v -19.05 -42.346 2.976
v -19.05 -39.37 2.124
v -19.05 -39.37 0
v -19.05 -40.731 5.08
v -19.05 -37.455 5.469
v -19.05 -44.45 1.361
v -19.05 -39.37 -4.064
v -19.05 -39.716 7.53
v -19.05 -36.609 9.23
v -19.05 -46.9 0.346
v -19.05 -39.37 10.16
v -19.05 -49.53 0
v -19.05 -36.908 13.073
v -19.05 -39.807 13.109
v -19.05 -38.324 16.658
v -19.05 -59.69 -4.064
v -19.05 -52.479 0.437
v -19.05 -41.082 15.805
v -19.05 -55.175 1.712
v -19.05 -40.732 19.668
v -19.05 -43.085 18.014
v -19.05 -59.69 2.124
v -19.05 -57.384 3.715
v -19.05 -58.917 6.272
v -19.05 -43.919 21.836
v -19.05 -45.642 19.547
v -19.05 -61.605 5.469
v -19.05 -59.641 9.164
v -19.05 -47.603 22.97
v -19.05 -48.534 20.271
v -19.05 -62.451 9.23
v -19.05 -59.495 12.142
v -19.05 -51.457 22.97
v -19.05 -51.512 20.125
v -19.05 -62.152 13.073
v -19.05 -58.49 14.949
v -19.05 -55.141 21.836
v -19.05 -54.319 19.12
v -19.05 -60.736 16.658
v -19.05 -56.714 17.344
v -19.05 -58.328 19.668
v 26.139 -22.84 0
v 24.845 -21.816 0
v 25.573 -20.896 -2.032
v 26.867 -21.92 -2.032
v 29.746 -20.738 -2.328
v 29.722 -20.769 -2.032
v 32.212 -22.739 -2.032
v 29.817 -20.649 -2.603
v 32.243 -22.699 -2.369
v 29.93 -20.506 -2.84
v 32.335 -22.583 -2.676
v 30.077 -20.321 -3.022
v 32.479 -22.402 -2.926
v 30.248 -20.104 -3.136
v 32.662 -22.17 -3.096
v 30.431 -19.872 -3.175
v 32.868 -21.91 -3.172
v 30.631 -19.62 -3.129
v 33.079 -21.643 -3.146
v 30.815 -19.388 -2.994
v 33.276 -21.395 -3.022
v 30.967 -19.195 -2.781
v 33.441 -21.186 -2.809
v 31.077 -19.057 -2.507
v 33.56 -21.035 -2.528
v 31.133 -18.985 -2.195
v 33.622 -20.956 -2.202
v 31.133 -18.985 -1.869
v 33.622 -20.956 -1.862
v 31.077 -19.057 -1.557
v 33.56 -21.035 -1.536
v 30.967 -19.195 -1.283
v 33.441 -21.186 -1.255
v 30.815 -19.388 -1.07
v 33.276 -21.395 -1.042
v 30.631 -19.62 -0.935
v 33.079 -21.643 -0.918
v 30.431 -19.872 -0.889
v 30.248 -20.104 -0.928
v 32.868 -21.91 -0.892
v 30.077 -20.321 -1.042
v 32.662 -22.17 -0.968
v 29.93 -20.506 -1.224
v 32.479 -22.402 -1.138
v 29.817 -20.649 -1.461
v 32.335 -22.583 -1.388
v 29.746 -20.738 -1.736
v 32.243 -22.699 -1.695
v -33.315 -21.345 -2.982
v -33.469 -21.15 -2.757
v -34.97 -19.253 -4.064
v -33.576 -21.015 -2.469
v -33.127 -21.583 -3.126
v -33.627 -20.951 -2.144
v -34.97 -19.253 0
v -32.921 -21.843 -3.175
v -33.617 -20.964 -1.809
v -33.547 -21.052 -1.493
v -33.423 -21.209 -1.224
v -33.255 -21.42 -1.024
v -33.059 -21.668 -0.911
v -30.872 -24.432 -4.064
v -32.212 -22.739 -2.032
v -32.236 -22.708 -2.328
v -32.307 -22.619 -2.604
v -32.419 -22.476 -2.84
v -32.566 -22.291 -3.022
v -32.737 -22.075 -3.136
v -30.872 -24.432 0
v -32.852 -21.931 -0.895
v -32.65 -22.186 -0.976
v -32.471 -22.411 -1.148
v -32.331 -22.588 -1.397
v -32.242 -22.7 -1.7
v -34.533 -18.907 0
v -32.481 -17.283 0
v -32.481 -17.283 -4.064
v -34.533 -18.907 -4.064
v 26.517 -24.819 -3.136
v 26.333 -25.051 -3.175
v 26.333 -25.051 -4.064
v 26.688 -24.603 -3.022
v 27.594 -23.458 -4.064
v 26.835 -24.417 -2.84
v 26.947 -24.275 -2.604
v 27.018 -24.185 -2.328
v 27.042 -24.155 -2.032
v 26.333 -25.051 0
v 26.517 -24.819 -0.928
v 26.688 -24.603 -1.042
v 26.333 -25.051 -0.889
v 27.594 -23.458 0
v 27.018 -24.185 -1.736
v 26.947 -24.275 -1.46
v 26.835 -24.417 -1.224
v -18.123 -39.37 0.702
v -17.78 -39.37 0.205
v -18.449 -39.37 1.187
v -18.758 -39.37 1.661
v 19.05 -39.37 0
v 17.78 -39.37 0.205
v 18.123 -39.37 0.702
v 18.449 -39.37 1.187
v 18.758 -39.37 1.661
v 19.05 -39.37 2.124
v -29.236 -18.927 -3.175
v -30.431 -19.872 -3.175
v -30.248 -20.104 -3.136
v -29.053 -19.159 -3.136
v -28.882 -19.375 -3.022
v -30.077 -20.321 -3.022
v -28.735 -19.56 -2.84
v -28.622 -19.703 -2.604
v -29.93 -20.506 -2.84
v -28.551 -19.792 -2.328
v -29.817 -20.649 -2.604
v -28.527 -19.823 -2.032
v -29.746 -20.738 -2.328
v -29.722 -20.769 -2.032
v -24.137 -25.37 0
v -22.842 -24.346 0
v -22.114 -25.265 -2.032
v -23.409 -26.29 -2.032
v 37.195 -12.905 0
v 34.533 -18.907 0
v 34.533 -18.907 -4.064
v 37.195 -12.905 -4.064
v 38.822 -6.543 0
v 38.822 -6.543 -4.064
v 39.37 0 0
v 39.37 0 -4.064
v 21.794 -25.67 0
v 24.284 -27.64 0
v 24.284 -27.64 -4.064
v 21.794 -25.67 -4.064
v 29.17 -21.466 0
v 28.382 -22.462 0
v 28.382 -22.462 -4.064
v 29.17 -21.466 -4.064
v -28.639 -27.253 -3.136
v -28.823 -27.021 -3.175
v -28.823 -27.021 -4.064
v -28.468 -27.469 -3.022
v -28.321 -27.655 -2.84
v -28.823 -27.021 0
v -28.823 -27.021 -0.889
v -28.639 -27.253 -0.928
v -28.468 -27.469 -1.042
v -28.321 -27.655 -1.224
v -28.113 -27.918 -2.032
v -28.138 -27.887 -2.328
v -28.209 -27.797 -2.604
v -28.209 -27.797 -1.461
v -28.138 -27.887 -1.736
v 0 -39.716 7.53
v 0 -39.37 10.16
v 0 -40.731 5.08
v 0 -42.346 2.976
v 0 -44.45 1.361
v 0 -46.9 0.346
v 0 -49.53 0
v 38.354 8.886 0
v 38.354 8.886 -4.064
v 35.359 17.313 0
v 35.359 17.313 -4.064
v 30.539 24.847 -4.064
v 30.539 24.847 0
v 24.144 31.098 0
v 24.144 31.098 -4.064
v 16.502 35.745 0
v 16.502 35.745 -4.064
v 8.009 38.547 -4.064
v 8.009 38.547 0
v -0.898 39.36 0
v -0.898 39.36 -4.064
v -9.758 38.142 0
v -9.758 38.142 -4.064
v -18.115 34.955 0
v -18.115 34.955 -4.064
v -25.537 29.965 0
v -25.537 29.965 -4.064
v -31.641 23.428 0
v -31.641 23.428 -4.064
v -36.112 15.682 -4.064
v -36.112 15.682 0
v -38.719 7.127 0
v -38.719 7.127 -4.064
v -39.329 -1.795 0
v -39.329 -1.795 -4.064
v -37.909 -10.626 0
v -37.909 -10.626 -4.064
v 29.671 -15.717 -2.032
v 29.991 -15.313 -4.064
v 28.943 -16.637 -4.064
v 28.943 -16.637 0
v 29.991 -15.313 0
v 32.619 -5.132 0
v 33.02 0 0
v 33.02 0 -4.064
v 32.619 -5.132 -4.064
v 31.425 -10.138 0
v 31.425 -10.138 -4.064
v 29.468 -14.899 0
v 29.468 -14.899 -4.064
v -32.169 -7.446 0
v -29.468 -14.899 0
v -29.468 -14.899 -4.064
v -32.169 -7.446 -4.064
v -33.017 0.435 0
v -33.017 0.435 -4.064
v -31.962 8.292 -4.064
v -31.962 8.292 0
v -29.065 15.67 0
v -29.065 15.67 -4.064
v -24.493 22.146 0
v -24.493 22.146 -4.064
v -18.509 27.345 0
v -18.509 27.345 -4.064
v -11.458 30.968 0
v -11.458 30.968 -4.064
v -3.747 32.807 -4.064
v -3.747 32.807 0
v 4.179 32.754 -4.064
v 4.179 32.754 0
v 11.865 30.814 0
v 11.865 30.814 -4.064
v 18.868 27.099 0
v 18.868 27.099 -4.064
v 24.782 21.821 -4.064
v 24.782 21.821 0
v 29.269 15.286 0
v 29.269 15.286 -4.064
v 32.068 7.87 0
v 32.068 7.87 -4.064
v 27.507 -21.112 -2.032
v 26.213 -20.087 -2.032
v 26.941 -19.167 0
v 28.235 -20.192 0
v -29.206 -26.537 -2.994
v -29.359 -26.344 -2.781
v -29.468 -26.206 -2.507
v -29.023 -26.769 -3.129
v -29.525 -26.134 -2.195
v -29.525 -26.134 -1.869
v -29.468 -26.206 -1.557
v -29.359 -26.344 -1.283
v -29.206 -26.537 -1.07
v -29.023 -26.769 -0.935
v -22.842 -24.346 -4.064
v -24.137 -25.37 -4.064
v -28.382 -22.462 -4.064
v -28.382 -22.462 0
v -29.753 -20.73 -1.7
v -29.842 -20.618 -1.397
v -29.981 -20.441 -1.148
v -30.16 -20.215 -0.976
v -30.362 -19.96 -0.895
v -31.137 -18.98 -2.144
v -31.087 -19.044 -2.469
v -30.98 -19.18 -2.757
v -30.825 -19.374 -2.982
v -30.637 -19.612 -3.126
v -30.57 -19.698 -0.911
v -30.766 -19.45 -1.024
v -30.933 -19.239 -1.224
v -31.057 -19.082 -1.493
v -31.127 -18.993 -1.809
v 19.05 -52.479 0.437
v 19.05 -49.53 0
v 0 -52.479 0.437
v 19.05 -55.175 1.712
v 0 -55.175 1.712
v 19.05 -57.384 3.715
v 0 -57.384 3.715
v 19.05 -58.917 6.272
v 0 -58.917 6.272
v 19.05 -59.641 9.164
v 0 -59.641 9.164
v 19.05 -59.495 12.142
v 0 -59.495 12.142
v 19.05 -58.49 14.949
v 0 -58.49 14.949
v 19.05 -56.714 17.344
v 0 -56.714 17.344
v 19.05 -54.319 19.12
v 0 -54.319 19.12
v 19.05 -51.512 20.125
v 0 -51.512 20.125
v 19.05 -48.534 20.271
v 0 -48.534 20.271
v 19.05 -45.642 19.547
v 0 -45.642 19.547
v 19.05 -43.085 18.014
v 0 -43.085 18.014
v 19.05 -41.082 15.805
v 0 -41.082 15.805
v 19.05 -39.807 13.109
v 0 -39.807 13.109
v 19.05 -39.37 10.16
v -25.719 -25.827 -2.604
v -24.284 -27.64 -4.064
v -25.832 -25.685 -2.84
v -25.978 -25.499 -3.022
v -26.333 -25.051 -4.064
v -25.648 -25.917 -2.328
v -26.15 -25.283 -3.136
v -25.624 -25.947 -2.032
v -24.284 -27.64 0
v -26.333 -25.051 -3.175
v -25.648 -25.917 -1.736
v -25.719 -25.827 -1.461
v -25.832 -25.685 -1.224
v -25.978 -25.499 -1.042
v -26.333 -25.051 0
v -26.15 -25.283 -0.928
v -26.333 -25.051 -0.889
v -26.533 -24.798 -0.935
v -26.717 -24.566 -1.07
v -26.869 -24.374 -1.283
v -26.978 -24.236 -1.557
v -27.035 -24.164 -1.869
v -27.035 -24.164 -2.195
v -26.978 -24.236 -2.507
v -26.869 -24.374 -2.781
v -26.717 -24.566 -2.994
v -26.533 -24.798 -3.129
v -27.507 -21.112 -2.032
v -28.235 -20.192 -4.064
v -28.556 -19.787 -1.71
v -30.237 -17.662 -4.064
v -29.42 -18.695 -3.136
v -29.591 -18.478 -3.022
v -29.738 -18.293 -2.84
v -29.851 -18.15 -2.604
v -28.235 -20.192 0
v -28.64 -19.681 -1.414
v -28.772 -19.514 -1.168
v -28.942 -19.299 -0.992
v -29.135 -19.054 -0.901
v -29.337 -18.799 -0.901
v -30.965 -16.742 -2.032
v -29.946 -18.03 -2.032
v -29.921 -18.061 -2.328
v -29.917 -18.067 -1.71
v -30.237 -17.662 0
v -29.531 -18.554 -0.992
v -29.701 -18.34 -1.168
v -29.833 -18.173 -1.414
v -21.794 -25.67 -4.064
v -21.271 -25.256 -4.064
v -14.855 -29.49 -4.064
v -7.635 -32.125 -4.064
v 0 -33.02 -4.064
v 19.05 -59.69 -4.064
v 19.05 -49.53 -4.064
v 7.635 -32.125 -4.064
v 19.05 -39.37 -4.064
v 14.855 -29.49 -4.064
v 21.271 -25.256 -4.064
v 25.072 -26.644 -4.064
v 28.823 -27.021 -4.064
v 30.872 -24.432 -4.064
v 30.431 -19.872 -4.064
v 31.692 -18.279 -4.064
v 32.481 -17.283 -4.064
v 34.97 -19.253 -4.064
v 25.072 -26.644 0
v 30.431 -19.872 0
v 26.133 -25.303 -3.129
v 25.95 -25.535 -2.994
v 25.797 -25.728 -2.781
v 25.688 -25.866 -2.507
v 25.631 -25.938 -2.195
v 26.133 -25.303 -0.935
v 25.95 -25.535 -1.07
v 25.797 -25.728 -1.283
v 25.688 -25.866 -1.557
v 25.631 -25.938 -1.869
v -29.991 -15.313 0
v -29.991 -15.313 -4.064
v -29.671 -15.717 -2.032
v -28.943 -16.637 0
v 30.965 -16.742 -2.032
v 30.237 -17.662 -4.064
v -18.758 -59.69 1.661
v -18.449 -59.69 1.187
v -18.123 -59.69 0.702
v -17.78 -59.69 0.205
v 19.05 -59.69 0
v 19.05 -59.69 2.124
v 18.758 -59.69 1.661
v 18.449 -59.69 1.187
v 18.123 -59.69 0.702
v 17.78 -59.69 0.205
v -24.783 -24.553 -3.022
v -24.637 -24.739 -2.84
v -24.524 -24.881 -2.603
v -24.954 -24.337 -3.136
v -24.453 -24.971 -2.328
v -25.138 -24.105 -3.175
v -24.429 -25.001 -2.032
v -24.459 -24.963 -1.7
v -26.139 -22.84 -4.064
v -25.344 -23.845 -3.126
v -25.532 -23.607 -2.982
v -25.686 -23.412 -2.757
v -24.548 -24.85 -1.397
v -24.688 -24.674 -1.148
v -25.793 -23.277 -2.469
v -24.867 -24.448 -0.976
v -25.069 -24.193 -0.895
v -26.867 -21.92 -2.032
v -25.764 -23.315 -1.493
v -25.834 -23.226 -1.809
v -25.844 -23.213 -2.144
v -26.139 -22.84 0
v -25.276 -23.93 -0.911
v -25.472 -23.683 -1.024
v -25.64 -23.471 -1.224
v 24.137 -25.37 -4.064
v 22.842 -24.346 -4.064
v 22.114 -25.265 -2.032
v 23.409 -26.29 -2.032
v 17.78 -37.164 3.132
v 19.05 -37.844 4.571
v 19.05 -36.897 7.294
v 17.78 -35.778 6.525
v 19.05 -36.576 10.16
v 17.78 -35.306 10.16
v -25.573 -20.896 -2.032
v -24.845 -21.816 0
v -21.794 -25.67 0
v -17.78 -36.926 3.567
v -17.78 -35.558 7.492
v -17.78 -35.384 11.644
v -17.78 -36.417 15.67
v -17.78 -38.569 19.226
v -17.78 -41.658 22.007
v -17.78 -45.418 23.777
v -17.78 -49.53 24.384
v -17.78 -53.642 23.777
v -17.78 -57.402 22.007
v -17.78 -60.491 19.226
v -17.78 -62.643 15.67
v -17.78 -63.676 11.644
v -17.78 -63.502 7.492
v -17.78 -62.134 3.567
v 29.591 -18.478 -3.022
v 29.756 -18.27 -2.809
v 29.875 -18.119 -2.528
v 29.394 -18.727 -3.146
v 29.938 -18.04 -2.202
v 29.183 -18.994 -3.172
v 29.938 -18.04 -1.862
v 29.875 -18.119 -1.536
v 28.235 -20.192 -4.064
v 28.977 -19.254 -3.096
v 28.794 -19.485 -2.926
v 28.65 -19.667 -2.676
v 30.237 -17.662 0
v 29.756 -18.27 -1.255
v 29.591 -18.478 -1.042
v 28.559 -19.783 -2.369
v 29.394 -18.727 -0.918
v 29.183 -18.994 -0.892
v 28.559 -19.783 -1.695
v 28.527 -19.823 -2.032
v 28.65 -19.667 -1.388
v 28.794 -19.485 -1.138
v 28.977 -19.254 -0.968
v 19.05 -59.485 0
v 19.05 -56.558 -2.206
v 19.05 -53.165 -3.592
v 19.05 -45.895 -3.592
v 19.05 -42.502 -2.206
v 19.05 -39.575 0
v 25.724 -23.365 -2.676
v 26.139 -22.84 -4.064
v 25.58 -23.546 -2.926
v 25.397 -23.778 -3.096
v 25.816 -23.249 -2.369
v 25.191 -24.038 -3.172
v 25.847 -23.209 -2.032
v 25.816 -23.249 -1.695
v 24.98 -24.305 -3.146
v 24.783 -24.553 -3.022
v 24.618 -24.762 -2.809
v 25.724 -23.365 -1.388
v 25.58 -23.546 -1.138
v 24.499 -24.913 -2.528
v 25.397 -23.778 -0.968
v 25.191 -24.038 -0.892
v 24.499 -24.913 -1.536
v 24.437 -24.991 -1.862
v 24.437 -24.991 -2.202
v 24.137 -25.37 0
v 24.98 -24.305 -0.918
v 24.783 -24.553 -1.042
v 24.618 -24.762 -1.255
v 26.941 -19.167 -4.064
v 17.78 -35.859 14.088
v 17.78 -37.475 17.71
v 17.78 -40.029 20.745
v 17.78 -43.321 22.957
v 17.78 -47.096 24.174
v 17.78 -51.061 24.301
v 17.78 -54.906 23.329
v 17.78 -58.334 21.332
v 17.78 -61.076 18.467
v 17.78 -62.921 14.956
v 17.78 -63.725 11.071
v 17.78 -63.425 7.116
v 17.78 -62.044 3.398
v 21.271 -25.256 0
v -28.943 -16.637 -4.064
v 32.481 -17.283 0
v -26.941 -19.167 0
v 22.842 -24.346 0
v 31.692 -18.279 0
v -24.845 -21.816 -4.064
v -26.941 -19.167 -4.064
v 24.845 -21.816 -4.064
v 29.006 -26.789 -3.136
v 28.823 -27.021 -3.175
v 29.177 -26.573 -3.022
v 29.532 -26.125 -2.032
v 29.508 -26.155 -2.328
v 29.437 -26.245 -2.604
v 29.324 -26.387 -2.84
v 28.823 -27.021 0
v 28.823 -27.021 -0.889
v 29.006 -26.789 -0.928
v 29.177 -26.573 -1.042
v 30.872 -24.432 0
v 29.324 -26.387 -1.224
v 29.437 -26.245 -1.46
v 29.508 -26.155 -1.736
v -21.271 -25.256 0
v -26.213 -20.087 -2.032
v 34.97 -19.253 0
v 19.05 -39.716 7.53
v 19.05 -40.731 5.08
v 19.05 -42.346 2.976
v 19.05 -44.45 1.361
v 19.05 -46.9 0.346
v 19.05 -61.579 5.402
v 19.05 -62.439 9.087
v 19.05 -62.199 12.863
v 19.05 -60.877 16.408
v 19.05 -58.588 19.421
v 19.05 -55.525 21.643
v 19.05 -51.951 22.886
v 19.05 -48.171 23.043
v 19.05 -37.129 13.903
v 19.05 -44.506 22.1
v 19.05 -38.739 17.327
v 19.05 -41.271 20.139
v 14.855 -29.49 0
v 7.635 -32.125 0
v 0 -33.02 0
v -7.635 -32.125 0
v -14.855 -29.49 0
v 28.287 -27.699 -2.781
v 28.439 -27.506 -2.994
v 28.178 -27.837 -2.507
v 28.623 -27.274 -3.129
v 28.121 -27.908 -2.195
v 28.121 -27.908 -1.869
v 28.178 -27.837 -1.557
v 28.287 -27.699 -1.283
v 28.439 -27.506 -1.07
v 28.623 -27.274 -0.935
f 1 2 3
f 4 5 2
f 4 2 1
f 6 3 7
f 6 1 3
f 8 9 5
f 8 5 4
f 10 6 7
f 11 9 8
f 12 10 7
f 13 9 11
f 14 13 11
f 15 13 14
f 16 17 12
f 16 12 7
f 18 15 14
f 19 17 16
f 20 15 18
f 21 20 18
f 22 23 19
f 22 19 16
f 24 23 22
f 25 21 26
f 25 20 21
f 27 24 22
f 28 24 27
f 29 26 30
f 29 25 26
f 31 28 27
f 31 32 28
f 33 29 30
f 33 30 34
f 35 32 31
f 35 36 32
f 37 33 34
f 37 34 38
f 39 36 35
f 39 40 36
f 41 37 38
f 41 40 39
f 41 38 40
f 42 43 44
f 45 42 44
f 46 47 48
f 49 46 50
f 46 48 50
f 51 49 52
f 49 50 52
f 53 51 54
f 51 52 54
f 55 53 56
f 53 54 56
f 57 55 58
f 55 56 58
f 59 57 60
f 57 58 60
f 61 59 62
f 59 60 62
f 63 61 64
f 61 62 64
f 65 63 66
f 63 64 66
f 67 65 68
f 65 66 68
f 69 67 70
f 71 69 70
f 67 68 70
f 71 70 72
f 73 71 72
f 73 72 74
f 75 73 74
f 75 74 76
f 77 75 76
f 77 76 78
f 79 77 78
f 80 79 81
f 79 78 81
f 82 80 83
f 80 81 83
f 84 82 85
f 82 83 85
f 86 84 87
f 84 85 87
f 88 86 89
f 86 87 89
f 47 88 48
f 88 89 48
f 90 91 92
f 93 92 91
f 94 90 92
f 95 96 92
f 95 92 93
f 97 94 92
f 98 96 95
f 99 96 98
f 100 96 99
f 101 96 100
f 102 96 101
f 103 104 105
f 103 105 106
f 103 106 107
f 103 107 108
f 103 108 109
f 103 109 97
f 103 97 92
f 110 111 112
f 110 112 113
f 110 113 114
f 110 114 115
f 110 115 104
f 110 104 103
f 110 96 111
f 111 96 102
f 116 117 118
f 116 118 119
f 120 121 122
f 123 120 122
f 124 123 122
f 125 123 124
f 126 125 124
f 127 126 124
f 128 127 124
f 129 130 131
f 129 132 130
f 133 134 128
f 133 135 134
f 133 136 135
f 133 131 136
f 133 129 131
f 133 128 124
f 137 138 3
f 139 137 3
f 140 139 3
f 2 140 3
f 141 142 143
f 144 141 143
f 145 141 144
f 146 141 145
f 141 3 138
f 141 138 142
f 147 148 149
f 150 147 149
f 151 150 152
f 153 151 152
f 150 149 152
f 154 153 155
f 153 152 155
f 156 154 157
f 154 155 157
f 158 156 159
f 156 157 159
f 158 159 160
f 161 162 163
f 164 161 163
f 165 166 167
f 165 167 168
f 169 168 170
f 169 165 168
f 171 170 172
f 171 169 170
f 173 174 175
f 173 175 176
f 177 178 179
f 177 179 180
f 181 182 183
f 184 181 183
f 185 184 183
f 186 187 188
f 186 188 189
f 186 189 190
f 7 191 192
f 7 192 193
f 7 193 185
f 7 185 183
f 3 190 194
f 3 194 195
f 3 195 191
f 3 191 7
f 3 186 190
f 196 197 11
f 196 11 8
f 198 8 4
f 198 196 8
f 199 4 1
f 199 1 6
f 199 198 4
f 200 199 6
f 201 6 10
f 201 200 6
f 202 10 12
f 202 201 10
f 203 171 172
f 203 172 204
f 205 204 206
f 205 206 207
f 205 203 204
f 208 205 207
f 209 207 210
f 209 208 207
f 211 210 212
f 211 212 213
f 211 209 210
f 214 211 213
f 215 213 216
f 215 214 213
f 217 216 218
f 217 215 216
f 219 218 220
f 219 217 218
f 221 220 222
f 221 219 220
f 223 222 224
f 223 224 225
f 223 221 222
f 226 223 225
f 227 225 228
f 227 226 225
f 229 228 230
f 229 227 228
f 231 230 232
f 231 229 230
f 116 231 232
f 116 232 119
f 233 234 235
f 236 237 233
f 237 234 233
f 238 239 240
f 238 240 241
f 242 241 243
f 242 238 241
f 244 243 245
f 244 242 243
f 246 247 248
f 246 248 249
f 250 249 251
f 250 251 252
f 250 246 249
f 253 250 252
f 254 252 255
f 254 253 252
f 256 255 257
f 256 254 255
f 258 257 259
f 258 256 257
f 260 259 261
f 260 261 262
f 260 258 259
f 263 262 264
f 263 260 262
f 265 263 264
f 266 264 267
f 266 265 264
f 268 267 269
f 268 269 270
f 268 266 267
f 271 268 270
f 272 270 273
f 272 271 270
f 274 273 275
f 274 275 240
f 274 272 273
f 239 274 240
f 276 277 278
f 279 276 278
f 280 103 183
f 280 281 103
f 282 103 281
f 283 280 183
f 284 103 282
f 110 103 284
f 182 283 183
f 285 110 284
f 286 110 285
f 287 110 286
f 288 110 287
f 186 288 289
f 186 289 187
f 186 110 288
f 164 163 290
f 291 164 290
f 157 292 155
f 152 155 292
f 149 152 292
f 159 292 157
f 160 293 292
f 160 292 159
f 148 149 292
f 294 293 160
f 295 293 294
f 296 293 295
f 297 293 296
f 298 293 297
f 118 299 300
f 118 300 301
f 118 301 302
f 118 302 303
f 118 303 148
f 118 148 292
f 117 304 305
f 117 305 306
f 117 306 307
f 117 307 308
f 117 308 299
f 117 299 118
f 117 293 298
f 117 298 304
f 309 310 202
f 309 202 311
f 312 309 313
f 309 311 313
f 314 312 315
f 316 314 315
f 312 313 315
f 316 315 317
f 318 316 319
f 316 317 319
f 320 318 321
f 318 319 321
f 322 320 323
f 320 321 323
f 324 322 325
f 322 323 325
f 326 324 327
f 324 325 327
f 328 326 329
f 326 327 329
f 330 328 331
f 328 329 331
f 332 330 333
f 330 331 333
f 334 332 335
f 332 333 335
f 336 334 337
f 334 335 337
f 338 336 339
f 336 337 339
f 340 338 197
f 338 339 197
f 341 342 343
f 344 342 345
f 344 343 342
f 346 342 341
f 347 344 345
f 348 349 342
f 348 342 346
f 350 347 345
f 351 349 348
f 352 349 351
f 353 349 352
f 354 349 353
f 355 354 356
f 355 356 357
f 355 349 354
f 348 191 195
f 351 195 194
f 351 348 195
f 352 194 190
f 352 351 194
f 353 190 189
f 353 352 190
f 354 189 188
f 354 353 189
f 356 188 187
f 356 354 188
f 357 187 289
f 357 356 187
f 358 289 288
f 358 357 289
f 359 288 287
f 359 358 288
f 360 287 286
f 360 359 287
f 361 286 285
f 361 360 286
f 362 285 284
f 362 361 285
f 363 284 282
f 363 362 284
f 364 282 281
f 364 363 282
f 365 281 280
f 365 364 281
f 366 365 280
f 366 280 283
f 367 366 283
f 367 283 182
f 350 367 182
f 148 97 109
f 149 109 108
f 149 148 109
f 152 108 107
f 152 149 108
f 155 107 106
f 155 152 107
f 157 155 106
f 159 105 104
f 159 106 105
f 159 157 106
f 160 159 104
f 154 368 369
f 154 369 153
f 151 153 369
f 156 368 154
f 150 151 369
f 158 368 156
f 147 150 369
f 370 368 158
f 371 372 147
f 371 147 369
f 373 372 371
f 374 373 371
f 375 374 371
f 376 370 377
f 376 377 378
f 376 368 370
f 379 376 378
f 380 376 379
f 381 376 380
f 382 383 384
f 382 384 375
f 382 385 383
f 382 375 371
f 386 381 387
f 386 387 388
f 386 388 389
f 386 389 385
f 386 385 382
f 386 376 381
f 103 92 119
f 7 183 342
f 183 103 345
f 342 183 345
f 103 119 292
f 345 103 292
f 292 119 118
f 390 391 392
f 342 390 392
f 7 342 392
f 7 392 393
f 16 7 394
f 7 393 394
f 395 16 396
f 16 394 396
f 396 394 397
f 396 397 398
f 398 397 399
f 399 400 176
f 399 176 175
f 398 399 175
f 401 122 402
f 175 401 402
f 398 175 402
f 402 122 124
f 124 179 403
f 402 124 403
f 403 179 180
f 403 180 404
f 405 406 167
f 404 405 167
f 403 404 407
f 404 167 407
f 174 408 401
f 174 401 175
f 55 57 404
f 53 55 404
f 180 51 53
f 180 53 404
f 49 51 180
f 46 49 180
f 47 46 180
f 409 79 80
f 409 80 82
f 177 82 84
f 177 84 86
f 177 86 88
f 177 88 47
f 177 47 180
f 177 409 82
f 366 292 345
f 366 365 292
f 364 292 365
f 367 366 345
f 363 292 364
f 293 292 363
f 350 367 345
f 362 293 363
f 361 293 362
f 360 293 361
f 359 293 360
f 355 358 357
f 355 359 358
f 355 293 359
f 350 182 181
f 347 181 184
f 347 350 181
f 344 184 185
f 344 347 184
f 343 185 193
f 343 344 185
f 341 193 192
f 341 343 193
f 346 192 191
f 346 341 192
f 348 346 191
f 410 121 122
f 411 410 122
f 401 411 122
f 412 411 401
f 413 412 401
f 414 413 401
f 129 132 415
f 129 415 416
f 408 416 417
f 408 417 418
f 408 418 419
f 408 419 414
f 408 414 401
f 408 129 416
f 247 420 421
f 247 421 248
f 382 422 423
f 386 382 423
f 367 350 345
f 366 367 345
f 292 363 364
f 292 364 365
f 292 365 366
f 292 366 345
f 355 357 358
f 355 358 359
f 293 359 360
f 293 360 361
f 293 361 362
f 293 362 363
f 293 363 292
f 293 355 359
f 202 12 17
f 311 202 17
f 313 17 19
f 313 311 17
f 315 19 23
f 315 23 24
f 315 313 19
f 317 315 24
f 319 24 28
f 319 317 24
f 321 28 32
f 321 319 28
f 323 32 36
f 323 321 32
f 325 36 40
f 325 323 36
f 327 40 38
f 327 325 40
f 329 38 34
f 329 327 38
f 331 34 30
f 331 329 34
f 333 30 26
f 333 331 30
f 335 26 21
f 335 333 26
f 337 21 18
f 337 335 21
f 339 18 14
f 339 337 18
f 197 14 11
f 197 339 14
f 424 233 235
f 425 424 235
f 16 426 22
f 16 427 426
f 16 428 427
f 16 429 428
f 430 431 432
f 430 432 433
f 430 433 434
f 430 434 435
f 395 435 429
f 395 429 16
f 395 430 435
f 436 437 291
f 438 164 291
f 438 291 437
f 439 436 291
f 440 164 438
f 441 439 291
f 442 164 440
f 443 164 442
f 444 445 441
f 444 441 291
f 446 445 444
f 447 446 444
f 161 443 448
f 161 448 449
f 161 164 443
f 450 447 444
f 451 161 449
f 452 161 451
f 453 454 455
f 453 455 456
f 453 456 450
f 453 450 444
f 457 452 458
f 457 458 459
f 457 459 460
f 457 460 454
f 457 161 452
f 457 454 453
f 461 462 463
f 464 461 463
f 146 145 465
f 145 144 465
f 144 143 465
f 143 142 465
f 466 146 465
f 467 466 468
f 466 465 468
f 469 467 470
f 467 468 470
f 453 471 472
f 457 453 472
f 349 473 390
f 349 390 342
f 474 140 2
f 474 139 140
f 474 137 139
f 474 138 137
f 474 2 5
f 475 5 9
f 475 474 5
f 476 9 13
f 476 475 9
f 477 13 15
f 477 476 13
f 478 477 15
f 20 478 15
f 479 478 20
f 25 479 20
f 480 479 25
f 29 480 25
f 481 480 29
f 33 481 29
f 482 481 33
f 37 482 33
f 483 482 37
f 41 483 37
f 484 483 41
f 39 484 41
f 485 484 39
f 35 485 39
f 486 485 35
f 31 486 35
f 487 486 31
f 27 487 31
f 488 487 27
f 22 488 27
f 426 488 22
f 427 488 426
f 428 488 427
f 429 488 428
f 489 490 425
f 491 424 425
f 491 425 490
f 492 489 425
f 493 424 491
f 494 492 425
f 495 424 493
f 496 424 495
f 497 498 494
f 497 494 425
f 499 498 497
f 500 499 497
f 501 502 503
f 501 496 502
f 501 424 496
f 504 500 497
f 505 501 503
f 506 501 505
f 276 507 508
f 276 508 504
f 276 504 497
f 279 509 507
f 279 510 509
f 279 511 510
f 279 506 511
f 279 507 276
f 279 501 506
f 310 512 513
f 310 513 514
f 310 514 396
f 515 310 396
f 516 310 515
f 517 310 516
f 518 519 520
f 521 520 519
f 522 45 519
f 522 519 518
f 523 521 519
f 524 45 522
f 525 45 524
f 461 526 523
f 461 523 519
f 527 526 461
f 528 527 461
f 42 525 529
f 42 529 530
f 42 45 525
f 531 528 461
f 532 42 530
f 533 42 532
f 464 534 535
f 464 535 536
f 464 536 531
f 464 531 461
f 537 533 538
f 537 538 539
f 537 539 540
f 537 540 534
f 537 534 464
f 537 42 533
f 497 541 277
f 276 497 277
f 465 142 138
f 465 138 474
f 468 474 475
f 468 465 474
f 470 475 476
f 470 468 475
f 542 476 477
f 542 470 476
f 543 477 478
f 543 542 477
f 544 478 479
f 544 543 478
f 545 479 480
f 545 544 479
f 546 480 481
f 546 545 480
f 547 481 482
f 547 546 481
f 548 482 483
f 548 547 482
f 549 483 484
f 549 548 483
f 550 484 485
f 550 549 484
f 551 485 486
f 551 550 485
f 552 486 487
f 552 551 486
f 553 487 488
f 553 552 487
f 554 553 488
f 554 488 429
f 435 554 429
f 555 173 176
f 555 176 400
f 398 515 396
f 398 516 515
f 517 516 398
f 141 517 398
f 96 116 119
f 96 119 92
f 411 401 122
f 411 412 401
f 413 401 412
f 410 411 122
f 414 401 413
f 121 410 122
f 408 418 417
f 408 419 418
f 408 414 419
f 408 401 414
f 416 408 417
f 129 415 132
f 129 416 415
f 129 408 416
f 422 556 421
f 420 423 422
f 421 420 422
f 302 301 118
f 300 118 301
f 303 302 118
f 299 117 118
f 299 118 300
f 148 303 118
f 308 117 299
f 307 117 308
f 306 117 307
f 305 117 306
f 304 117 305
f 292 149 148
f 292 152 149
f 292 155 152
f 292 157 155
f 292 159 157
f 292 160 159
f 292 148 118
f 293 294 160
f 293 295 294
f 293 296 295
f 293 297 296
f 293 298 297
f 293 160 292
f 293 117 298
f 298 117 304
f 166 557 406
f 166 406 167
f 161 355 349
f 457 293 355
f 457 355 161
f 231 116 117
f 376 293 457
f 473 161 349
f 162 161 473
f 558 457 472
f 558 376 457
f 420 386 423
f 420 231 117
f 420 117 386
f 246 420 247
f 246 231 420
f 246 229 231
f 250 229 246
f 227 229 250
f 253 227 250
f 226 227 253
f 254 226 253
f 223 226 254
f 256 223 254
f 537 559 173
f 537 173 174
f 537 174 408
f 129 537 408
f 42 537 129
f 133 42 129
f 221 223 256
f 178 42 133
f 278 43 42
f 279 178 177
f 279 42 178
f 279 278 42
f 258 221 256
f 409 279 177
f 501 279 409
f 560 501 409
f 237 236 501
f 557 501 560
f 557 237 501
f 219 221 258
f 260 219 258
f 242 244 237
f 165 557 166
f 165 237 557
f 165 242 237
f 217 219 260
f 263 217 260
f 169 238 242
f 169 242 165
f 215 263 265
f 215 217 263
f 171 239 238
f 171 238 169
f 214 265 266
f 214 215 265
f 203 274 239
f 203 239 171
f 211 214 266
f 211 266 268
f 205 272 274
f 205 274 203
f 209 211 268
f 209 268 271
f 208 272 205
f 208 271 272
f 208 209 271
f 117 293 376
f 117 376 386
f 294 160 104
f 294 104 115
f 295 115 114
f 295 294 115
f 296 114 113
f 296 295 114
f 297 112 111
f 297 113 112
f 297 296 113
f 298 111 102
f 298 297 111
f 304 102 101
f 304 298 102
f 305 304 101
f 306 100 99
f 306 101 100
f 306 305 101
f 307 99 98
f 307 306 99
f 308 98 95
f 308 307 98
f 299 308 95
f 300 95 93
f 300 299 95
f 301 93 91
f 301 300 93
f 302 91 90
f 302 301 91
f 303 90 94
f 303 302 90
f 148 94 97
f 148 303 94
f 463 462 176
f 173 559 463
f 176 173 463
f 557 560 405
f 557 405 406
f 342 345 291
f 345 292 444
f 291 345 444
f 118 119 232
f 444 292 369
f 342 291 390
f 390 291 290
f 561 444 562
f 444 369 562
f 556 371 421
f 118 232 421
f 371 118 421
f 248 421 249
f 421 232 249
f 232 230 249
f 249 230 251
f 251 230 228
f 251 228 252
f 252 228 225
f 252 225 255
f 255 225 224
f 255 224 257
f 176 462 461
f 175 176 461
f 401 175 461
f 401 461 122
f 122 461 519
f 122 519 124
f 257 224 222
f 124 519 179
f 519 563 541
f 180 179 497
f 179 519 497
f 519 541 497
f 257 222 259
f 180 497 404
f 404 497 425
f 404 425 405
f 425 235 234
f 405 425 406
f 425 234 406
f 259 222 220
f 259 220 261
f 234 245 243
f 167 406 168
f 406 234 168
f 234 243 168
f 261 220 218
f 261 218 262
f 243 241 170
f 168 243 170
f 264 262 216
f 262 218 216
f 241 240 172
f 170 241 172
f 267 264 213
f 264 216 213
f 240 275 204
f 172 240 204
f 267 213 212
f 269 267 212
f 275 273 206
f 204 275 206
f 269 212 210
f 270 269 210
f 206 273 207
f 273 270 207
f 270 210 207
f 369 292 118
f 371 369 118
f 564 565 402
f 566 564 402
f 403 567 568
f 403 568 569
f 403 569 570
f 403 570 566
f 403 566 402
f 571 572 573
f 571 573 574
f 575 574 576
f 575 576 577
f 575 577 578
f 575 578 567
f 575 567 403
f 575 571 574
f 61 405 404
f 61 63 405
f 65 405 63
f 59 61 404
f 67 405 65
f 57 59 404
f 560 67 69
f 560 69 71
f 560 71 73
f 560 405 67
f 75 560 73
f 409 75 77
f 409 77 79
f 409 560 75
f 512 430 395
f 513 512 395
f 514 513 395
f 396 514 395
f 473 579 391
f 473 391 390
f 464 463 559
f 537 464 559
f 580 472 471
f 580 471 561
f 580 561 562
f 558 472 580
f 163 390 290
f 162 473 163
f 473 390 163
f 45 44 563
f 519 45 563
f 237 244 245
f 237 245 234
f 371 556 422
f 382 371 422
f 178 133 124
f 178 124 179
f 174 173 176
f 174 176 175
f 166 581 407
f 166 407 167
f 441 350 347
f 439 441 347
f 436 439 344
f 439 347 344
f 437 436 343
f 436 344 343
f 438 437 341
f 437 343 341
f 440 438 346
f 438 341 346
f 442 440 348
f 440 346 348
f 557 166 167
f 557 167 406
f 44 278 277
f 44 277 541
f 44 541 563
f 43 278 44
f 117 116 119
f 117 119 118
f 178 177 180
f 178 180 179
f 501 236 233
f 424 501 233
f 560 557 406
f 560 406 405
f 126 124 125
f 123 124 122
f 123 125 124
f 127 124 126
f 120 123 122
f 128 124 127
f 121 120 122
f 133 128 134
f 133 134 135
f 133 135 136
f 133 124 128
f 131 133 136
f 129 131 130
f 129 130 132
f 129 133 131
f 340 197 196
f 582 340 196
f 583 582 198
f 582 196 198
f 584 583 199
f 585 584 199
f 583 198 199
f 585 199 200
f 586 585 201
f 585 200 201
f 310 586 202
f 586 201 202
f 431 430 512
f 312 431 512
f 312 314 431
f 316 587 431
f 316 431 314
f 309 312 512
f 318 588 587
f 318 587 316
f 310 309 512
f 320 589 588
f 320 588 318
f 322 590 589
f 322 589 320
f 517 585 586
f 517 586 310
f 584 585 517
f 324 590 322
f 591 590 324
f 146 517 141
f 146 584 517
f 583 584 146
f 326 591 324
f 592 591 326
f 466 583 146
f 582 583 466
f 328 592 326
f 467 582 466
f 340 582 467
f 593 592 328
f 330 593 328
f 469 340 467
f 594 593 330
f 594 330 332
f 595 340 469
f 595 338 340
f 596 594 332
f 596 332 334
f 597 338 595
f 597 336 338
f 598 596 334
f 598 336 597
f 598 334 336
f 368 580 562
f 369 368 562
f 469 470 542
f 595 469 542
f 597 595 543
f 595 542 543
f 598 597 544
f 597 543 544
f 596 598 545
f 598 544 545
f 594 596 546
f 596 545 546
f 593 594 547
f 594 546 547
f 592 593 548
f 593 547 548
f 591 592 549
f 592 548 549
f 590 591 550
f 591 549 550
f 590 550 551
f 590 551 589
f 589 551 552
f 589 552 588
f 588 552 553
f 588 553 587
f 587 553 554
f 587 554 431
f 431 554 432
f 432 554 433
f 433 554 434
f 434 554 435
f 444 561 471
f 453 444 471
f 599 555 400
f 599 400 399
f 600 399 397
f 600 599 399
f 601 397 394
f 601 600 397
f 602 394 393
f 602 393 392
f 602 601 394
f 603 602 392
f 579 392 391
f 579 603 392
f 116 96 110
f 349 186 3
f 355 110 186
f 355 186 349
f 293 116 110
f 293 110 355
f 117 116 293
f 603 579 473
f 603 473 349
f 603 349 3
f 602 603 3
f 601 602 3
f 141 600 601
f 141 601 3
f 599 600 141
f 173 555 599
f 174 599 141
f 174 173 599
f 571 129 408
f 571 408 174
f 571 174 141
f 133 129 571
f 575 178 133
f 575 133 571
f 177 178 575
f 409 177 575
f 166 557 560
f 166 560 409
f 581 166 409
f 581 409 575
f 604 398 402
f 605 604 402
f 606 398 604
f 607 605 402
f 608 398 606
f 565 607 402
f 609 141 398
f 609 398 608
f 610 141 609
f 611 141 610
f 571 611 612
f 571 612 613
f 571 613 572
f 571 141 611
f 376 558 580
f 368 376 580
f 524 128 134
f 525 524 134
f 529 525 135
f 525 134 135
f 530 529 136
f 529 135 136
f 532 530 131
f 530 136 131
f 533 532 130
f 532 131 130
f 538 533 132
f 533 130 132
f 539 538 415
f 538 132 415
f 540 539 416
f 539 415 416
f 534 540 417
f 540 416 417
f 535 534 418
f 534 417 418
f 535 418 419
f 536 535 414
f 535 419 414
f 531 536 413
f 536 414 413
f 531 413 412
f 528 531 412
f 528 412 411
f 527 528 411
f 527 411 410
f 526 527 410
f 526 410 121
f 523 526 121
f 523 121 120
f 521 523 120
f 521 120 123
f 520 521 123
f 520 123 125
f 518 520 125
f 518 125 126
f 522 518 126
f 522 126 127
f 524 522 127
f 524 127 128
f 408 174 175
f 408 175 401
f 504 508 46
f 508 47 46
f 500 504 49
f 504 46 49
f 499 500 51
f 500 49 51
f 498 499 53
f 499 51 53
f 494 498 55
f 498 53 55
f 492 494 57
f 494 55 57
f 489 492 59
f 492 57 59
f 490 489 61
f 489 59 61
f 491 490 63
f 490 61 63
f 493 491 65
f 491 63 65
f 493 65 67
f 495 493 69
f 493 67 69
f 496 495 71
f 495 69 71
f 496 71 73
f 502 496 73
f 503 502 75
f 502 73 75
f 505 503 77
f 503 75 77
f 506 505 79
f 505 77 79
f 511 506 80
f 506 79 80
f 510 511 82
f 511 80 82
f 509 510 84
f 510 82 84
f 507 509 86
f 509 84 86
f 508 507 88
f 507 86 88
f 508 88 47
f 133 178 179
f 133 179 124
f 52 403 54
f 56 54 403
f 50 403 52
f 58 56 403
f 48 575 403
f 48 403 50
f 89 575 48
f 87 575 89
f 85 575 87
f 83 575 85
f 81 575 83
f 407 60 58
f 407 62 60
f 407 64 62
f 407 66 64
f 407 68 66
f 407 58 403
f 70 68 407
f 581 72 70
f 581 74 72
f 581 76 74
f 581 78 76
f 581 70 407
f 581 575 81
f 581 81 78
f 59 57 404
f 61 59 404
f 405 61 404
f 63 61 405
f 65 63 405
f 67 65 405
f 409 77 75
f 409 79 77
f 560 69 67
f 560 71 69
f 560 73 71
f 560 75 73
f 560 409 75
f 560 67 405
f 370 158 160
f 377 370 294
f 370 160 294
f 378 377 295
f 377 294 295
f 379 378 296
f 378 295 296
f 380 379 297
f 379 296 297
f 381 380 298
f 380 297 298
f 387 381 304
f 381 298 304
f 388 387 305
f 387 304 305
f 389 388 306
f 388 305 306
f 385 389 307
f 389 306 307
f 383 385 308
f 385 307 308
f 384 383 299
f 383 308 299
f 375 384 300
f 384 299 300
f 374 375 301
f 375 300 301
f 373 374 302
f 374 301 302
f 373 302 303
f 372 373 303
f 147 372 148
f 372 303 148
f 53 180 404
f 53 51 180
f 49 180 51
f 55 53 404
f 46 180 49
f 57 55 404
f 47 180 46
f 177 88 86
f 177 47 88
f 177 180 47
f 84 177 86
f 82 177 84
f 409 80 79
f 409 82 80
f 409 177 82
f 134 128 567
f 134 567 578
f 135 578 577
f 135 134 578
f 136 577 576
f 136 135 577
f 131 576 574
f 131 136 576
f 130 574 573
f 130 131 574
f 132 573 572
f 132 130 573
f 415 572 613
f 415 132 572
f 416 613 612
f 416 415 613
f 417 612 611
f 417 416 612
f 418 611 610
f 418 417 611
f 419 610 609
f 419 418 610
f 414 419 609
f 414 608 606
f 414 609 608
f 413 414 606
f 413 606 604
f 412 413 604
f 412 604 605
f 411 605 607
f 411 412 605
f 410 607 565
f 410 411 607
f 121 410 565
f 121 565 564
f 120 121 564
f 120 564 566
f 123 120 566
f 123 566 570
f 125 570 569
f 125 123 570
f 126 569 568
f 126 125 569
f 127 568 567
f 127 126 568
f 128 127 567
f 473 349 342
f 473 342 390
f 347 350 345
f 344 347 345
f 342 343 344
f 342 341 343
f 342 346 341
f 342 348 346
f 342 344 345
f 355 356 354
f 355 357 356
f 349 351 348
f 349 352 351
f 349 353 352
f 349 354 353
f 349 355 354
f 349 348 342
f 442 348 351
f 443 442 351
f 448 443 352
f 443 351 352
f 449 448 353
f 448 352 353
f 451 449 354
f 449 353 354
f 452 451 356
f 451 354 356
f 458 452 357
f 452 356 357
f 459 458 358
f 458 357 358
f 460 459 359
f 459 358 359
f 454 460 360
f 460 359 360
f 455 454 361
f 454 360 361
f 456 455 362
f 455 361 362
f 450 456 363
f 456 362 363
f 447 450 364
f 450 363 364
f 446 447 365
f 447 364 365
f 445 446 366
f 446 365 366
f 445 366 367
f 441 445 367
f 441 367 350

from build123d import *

# Parameters (mm, degrees)
F1_DEPTH  = 4.064
F2_DEPTH  = 4.064
F4_DEPTH  = 12.7
F5_R      = 1.143
F6_DEPTH  = 12.7
F7_R      = 1.143
F8_DEPTH  = 1.651
F9_R      = 1.143
F10_DEPTH = 1.651
F12_DEPTH = 19.05
F13_SIZE  = 1.27


with BuildPart() as f1:
    # F0 (on Top) → F1 (new body)
    with BuildSketch(Plane.XY):
        with BuildLine():
            ThreePointArc((-29.4677101906, -14.8988072046), (-7.6582181186, 32.1196527884), (33.02, 0))
            ThreePointArc((33.02, 0), (32.1196527884, -7.6582181186), (29.4677101906, -14.8988072046))
            Line((29.4677101906, -14.8988072046), (29.990846543, -15.3128161889))
            Line((29.990846543, -15.3128161889), (25.8925801012, -20.4913322091))
            Line((25.8925801012, -20.4913322091), (28.3822512648, -22.4616526138))
            Line((28.3822512648, -22.4616526138), (29.1703794266, -21.4657841484))
            Line((29.1703794266, -21.4657841484), (30.4313844857, -19.8723946037))
            Line((30.4313844857, -19.8723946037), (31.6923895447, -18.279005059))
            Line((31.6923895447, -18.279005059), (32.4805177066, -17.2831365936))
            Line((32.4805177066, -17.2831365936), (34.5327627618, -18.9072789168))
            ThreePointArc((34.5327627618, -18.9072789168), (38.1415244185, -9.7581255902), (39.37, 0))
            ThreePointArc((39.37, 0), (-9.7581255902, 38.1415244185), (-34.5327627618, -18.9072789168))
            Line((-34.5327627618, -18.9072789168), (-32.4805177066, -17.2831365936))
            Line((-32.4805177066, -17.2831365936), (-30.4313844857, -19.8723946037))
            Line((-30.4313844857, -19.8723946037), (-28.3822512648, -22.4616526138))
            Line((-28.3822512648, -22.4616526138), (-25.8925801012, -20.4913322091))
            Line((-25.8925801012, -20.4913322091), (-29.990846543, -15.3128161889))
            Line((-29.990846543, -15.3128161889), (-29.4677101906, -14.8988072046))
        make_face()
        Polygon((-21.7943136594, -25.6698482293), (-25.8925801012, -20.4913322091), (-28.3822512648, -22.4616526138), (-26.3331180438, -25.0509106239), (-24.2839848229, -27.6401686341), align=None)
        Polygon((28.3822512648, -22.4616526138), (25.8925801012, -20.4913322091), (21.7943136594, -25.6698482293), (24.2839848229, -27.6401686341), (25.0721129848, -26.6443001686), (26.3331180438, -25.0509106239), (27.5941231029, -23.4575210793), align=None)
    extrude(amount=-F1_DEPTH)


with BuildPart() as f2:
    # F0 (on Top) → F2 (new body)
    with BuildSketch(Plane.XY):
        Polygon((0, -59.69), (0, -39.37), (-10.9520430108, -39.37), (-15.0010215054, -39.37), (-19.05, -39.37), (-19.05, -59.69), align=None)
        Polygon((10.9520430108, -39.37), (0, -39.37), (0, -59.69), (19.05, -59.69), (19.05, -39.37), (15.0010215054, -39.37), align=None)
        with BuildLine():
            ThreePointArc((-18.7699951594, -34.6075740513), (-24.0499346053, -31.1704595006), (-28.714015795, -26.935147984))
            Line((-28.714015795, -26.935147984), (-28.8227892074, -27.0212310287))
            Line((-28.8227892074, -27.0212310287), (-19.05, -39.37))
            Line((-19.05, -39.37), (-15.0010215054, -39.37))
            Line((-15.0010215054, -39.37), (-18.7699951594, -34.6075740513))
        make_face()
        with BuildLine():
            Line((-10.9520430108, -39.37), (-12.5874453828, -37.3035268941))
            ThreePointArc((-12.5874453828, -37.3035268941), (-15.7365596549, -36.0881918393), (-18.7699951594, -34.6075740513))
            Line((-18.7699951594, -34.6075740513), (-15.0010215054, -39.37))
            Line((-15.0010215054, -39.37), (-10.9520430108, -39.37))
        make_face()
        with BuildLine():
            ThreePointArc((0, -39.37), (-6.3779717066, -38.8499469357), (-12.5874453828, -37.3035268941))
            Line((-12.5874453828, -37.3035268941), (-10.9520430108, -39.37))
            Line((-10.9520430108, -39.37), (0, -39.37))
        make_face()
        with BuildLine():
            ThreePointArc((21.271177307, -25.2558392451), (0, -33.02), (-21.271177307, -25.2558392451))
            Line((-21.271177307, -25.2558392451), (-21.7943136594, -25.6698482293))
            Line((-21.7943136594, -25.6698482293), (-12.5874453828, -37.3035268941))
            ThreePointArc((-12.5874453828, -37.3035268941), (-6.3779717066, -38.8499469357), (0, -39.37))
            ThreePointArc((0, -39.37), (6.3779717066, -38.8499469357), (12.5874453828, -37.3035268941))
            Line((12.5874453828, -37.3035268941), (21.7943136594, -25.6698482293))
            Line((21.7943136594, -25.6698482293), (21.271177307, -25.2558392451))
        make_face()
        with BuildLine():
            Line((24.2839848229, -27.6401686341), (21.7943136594, -25.6698482293))
            Line((21.7943136594, -25.6698482293), (12.5874453828, -37.3035268941))
            ThreePointArc((12.5874453828, -37.3035268941), (15.7365596549, -36.0881918393), (18.7699951594, -34.6075740513))
            Line((18.7699951594, -34.6075740513), (24.2839848229, -27.6401686341))
        make_face()
        with BuildLine():
            Line((10.9520430108, -39.37), (12.5874453828, -37.3035268941))
            ThreePointArc((12.5874453828, -37.3035268941), (6.3779717066, -38.8499469357), (0, -39.37))
            Line((0, -39.37), (10.9520430108, -39.37))
        make_face()
        with BuildLine():
            ThreePointArc((18.7699951594, -34.6075740513), (15.7365596549, -36.0881918393), (12.5874453828, -37.3035268941))
            Line((12.5874453828, -37.3035268941), (10.9520430108, -39.37))
            Line((10.9520430108, -39.37), (15.0010215054, -39.37))
            Line((15.0010215054, -39.37), (18.7699951594, -34.6075740513))
        make_face()
        with BuildLine():
            Line((28.8227892074, -27.0212310287), (28.714015795, -26.935147984))
            ThreePointArc((28.714015795, -26.935147984), (24.0499346053, -31.1704595006), (18.7699951594, -34.6075740513))
            Line((18.7699951594, -34.6075740513), (15.0010215054, -39.37))
            Line((15.0010215054, -39.37), (19.05, -39.37))
            Line((19.05, -39.37), (28.8227892074, -27.0212310287))
        make_face()
        with BuildLine():
            Line((25.0721129848, -26.6443001686), (24.2839848229, -27.6401686341))
            Line((24.2839848229, -27.6401686341), (18.7699951594, -34.6075740513))
            ThreePointArc((18.7699951594, -34.6075740513), (24.0499346053, -31.1704595006), (28.714015795, -26.935147984))
            Line((28.714015795, -26.935147984), (26.3331180438, -25.0509106239))
            Line((26.3331180438, -25.0509106239), (25.0721129848, -26.6443001686))
        make_face()
        with BuildLine():
            Line((28.8227892074, -27.0212310287), (30.8719224283, -24.4319730185))
            ThreePointArc((30.8719224283, -24.4319730185), (29.8192468, -25.7062136512), (28.714015795, -26.935147984))
            Line((28.714015795, -26.935147984), (28.8227892074, -27.0212310287))
        make_face()
        with BuildLine():
            Line((30.8719224283, -24.4319730185), (28.3822512648, -22.4616526138))
            Line((28.3822512648, -22.4616526138), (27.5941231029, -23.4575210793))
            Line((27.5941231029, -23.4575210793), (26.3331180438, -25.0509106239))
            Line((26.3331180438, -25.0509106239), (28.714015795, -26.935147984))
            ThreePointArc((28.714015795, -26.935147984), (29.8192468, -25.7062136512), (30.8719224283, -24.4319730185))
        make_face()
        with BuildLine():
            Line((29.1703794266, -21.4657841484), (28.3822512648, -22.4616526138))
            Line((28.3822512648, -22.4616526138), (30.8719224283, -24.4319730185))
            ThreePointArc((30.8719224283, -24.4319730185), (31.8701873763, -23.1146718904), (32.8122822369, -21.7566319638))
            Line((32.8122822369, -21.7566319638), (30.4313844857, -19.8723946037))
            Line((30.4313844857, -19.8723946037), (29.1703794266, -21.4657841484))
        make_face()
        with BuildLine():
            Line((30.4313844857, -19.8723946037), (32.8122822369, -21.7566319638))
            ThreePointArc((32.8122822369, -21.7566319638), (33.702647888, -20.3501455851), (34.5327627618, -18.9072789168))
            Line((34.5327627618, -18.9072789168), (32.4805177066, -17.2831365936))
            Line((32.4805177066, -17.2831365936), (31.6923895447, -18.279005059))
            Line((31.6923895447, -18.279005059), (30.4313844857, -19.8723946037))
        make_face()
        with BuildLine():
            Line((-12.5874453828, -37.3035268941), (-21.7943136594, -25.6698482293))
            Line((-21.7943136594, -25.6698482293), (-24.2839848229, -27.6401686341))
            Line((-24.2839848229, -27.6401686341), (-18.7699951594, -34.6075740513))
            ThreePointArc((-18.7699951594, -34.6075740513), (-15.7365596549, -36.0881918393), (-12.5874453828, -37.3035268941))
        make_face()
        with BuildLine():
            ThreePointArc((-28.714015795, -26.935147984), (-29.8192468, -25.7062136512), (-30.8719224283, -24.4319730185))
            Line((-30.8719224283, -24.4319730185), (-28.8227892074, -27.0212310287))
            Line((-28.8227892074, -27.0212310287), (-28.714015795, -26.935147984))
        make_face()
        with BuildLine():
            Line((-24.2839848229, -27.6401686341), (-26.3331180438, -25.0509106239))
            Line((-26.3331180438, -25.0509106239), (-28.714015795, -26.935147984))
            ThreePointArc((-28.714015795, -26.935147984), (-24.0499346053, -31.1704595006), (-18.7699951594, -34.6075740513))
            Line((-18.7699951594, -34.6075740513), (-24.2839848229, -27.6401686341))
        make_face()
        with BuildLine():
            Line((-26.3331180438, -25.0509106239), (-28.3822512648, -22.4616526138))
            Line((-28.3822512648, -22.4616526138), (-30.8719224283, -24.4319730185))
            ThreePointArc((-30.8719224283, -24.4319730185), (-29.8192468, -25.7062136512), (-28.714015795, -26.935147984))
            Line((-28.714015795, -26.935147984), (-26.3331180438, -25.0509106239))
        make_face()
        with BuildLine():
            Line((-30.8719224283, -24.4319730185), (-28.3822512648, -22.4616526138))
            Line((-28.3822512648, -22.4616526138), (-30.4313844857, -19.8723946037))
            Line((-30.4313844857, -19.8723946037), (-32.8122822369, -21.7566319638))
            ThreePointArc((-32.8122822369, -21.7566319638), (-31.8701873763, -23.1146718904), (-30.8719224283, -24.4319730185))
        make_face()
        with BuildLine():
            Line((-32.8122822369, -21.7566319638), (-30.4313844857, -19.8723946037))
            Line((-30.4313844857, -19.8723946037), (-32.4805177066, -17.2831365936))
            Line((-32.4805177066, -17.2831365936), (-34.5327627618, -18.9072789168))
            ThreePointArc((-34.5327627618, -18.9072789168), (-33.702647888, -20.3501455851), (-32.8122822369, -21.7566319638))
        make_face()
        with BuildLine():
            ThreePointArc((32.8122822369, -21.7566319638), (31.8701873763, -23.1146718904), (30.8719224283, -24.4319730185))
            Line((30.8719224283, -24.4319730185), (34.9701888702, -19.2534569983))
            Line((34.9701888702, -19.2534569983), (34.5327627618, -18.9072789168))
            ThreePointArc((34.5327627618, -18.9072789168), (33.702647888, -20.3501455851), (32.8122822369, -21.7566319638))
        make_face()
        with BuildLine():
            Line((-34.9701888702, -19.2534569983), (-30.8719224283, -24.4319730185))
            ThreePointArc((-30.8719224283, -24.4319730185), (-31.8701873763, -23.1146718904), (-32.8122822369, -21.7566319638))
            ThreePointArc((-32.8122822369, -21.7566319638), (-33.702647888, -20.3501455851), (-34.5327627618, -18.9072789168))
            Line((-34.5327627618, -18.9072789168), (-34.9701888702, -19.2534569983))
        make_face()
    extrude(amount=-F2_DEPTH)


with BuildPart() as f4_tool:
    # F3 (on face) → F4 (new body, symmetric)
    with BuildSketch(Plane(origin=(-28.3822512648, -22.4616526138, 0), x_dir=(0.6205733558, -0.784148398, 0), z_dir=(-0.784148398, -0.6205733558, 0))):
        with BuildLine():
            ThreePointArc((-2.159, -2.032), (-4.1102230509, -1.2237769491), (-3.302, -3.175))
            ThreePointArc((-3.302, -3.175), (-2.4937769491, -2.8402230509), (-2.159, -2.032))
        make_face()
        with BuildLine():
            ThreePointArc((4.445, -2.032), (2.4937769491, -1.2237769491), (3.302, -3.175))
            ThreePointArc((3.302, -3.175), (4.1102230509, -2.8402230509), (4.445, -2.032))
        make_face()
    extrude(amount=F4_DEPTH, both=True)


with BuildPart() as f1_1:
    add(f1.part)

    # F4: cut by f4_tool
    add(f4_tool.part, mode=Mode.SUBTRACT)


with BuildPart() as f2_1:
    add(f2.part)

    # F4: cut by f4_tool
    add(f4_tool.part, mode=Mode.SUBTRACT)


with BuildPart() as f6_tool:
    # F5 (on face) → F6 (new body, symmetric)
    with BuildSketch(Plane(origin=(28.3822512648, -22.4616526138, 0), x_dir=(0.6205733558, 0.784148398, 0), z_dir=(0.784148398, -0.6205733558, 0))):
        with Locations((-3.302, -2.032)):
            Circle(F5_R)
        with BuildLine():
            ThreePointArc((4.445, -2.032), (3.302, -0.889), (2.159, -2.032))
            ThreePointArc((2.159, -2.032), (3.302, -3.175), (4.445, -2.032))
        make_face()
    extrude(amount=F6_DEPTH, both=True)


with BuildPart() as f1_2:
    add(f1_1.part)

    # F6: cut by f6_tool
    add(f6_tool.part, mode=Mode.SUBTRACT)

    # F7 (on face) → F8 (cut)
    with BuildSketch(Plane(origin=(-25.8925801012, -20.4913322091, 0), x_dir=(-0.6205733558, 0.784148398, 0), z_dir=(0.784148398, 0.6205733558, 0))):
        Polygon((1.6888833479, -4.064), (3.302, -4.064), (4.9151166521, -4.064), (6.0882923991, -2.032), (4.9151166521, 0), (1.6888833479, 0), (0.5157076009, -2.032), align=None)
        with BuildLine():
            ThreePointArc((3.302, -3.175), (2.4937769491, -1.2237769491), (4.445, -2.032))
            ThreePointArc((4.445, -2.032), (4.1102230509, -2.8402230509), (3.302, -3.175))
        make_face(mode=Mode.SUBTRACT)
        Polygon((-4.9151166521, -4.064), (-1.6888833479, -4.064), (-0.5157076009, -2.032), (-1.6888833479, 0), (-4.9151166521, 0), (-6.0882923991, -2.032), align=None)
        with Locations((-3.302, -2.032)):
            Circle(F7_R, mode=Mode.SUBTRACT)
    extrude(amount=-F8_DEPTH, mode=Mode.SUBTRACT)

    # F9 (on face) → F10 (cut)
    with BuildSketch(Plane(origin=(25.8925801012, -20.4913322091, 0), x_dir=(-0.6205733558, -0.784148398, 0), z_dir=(-0.784148398, 0.6205733558, 0))):
        Polygon((-1.6888833479, 0), (-4.9151166521, 0), (-6.0882923991, -2.032), (-4.9151166521, -4.064), (-1.6888833479, -4.064), (-0.5157076009, -2.032), align=None)
        with Locations((-3.302, -2.032)):
            Circle(F9_R, mode=Mode.SUBTRACT)
        Polygon((4.9151166521, 0), (1.6888833479, 0), (0.5157076009, -2.032), (1.6888833479, -4.064), (4.9151166521, -4.064), (6.0882923991, -2.032), align=None)
        with Locations((3.302, -2.032)):
            Circle(F9_R, mode=Mode.SUBTRACT)
    extrude(amount=-F10_DEPTH, mode=Mode.SUBTRACT)


with BuildPart() as f2_2:
    add(f2_1.part)

    # F6: cut by f6_tool
    add(f6_tool.part, mode=Mode.SUBTRACT)

    # F11 (on Right) → F12 (join, symmetric)
    with BuildSketch(Plane.YZ):
        with BuildLine():
            ThreePointArc((-49.53, -4.064), (-44.1538333359, -3.0088650992), (-39.5752736853, 0))
            Line((-39.5752736853, 0), (-49.53, 0))
            Line((-49.53, 0), (-49.53, -4.064))
        make_face()
        with BuildLine():
            Line((-49.53, -4.064), (-49.53, 0))
            Line((-49.53, 0), (-59.4847263147, 0))
            ThreePointArc((-59.4847263147, 0), (-54.9061666641, -3.0088650992), (-49.53, -4.064))
        make_face()
        with BuildLine():
            Line((-49.53, 0), (-39.5752736853, 0))
            ThreePointArc((-39.5752736853, 0), (-39.4721131444, 0.1021131444), (-39.37, 0.2052736853))
            ThreePointArc((-39.37, 0.2052736853), (-36.3611349008, 4.7838333359), (-35.306, 10.16))
            ThreePointArc((-35.306, 10.16), (-54.9061666641, 23.3288650992), (-59.69, 0.2052736853))
            ThreePointArc((-59.69, 0.2052736853), (-59.5878868556, 0.1021131444), (-59.4847263147, 0))
            Line((-59.4847263147, 0), (-49.53, 0))
        make_face()
        with BuildLine():
            ThreePointArc((-39.37, 10.16), (-42.3457951031, 2.9757951031), (-49.53, 0))
            ThreePointArc((-49.53, 0), (-56.7142048969, 17.3442048969), (-39.37, 10.16))
        make_face(mode=Mode.SUBTRACT)
        with BuildLine():
            Line((-39.5752736853, 0), (-39.37, 0))
            Line((-39.37, 0), (-39.37, 0.2052736853))
            ThreePointArc((-39.37, 0.2052736853), (-39.4721131444, 0.1021131444), (-39.5752736853, 0))
        make_face()
        with BuildLine():
            Line((-59.69, 0), (-59.4847263147, 0))
            ThreePointArc((-59.4847263147, 0), (-59.5878868556, 0.1021131444), (-59.69, 0.2052736853))
            Line((-59.69, 0.2052736853), (-59.69, 0))
        make_face()
    extrude(amount=F12_DEPTH, both=True)

    # F13
    f13_edges = [f2_2.edges().sort_by_distance(p)[0] for p in [
        (-19.05, -49.53, 24.384),
        (19.05, -49.53, 24.384),
    ]]
    chamfer(f13_edges, length=F13_SIZE)


solid = Compound([f1_2.part, f2_2.part])
